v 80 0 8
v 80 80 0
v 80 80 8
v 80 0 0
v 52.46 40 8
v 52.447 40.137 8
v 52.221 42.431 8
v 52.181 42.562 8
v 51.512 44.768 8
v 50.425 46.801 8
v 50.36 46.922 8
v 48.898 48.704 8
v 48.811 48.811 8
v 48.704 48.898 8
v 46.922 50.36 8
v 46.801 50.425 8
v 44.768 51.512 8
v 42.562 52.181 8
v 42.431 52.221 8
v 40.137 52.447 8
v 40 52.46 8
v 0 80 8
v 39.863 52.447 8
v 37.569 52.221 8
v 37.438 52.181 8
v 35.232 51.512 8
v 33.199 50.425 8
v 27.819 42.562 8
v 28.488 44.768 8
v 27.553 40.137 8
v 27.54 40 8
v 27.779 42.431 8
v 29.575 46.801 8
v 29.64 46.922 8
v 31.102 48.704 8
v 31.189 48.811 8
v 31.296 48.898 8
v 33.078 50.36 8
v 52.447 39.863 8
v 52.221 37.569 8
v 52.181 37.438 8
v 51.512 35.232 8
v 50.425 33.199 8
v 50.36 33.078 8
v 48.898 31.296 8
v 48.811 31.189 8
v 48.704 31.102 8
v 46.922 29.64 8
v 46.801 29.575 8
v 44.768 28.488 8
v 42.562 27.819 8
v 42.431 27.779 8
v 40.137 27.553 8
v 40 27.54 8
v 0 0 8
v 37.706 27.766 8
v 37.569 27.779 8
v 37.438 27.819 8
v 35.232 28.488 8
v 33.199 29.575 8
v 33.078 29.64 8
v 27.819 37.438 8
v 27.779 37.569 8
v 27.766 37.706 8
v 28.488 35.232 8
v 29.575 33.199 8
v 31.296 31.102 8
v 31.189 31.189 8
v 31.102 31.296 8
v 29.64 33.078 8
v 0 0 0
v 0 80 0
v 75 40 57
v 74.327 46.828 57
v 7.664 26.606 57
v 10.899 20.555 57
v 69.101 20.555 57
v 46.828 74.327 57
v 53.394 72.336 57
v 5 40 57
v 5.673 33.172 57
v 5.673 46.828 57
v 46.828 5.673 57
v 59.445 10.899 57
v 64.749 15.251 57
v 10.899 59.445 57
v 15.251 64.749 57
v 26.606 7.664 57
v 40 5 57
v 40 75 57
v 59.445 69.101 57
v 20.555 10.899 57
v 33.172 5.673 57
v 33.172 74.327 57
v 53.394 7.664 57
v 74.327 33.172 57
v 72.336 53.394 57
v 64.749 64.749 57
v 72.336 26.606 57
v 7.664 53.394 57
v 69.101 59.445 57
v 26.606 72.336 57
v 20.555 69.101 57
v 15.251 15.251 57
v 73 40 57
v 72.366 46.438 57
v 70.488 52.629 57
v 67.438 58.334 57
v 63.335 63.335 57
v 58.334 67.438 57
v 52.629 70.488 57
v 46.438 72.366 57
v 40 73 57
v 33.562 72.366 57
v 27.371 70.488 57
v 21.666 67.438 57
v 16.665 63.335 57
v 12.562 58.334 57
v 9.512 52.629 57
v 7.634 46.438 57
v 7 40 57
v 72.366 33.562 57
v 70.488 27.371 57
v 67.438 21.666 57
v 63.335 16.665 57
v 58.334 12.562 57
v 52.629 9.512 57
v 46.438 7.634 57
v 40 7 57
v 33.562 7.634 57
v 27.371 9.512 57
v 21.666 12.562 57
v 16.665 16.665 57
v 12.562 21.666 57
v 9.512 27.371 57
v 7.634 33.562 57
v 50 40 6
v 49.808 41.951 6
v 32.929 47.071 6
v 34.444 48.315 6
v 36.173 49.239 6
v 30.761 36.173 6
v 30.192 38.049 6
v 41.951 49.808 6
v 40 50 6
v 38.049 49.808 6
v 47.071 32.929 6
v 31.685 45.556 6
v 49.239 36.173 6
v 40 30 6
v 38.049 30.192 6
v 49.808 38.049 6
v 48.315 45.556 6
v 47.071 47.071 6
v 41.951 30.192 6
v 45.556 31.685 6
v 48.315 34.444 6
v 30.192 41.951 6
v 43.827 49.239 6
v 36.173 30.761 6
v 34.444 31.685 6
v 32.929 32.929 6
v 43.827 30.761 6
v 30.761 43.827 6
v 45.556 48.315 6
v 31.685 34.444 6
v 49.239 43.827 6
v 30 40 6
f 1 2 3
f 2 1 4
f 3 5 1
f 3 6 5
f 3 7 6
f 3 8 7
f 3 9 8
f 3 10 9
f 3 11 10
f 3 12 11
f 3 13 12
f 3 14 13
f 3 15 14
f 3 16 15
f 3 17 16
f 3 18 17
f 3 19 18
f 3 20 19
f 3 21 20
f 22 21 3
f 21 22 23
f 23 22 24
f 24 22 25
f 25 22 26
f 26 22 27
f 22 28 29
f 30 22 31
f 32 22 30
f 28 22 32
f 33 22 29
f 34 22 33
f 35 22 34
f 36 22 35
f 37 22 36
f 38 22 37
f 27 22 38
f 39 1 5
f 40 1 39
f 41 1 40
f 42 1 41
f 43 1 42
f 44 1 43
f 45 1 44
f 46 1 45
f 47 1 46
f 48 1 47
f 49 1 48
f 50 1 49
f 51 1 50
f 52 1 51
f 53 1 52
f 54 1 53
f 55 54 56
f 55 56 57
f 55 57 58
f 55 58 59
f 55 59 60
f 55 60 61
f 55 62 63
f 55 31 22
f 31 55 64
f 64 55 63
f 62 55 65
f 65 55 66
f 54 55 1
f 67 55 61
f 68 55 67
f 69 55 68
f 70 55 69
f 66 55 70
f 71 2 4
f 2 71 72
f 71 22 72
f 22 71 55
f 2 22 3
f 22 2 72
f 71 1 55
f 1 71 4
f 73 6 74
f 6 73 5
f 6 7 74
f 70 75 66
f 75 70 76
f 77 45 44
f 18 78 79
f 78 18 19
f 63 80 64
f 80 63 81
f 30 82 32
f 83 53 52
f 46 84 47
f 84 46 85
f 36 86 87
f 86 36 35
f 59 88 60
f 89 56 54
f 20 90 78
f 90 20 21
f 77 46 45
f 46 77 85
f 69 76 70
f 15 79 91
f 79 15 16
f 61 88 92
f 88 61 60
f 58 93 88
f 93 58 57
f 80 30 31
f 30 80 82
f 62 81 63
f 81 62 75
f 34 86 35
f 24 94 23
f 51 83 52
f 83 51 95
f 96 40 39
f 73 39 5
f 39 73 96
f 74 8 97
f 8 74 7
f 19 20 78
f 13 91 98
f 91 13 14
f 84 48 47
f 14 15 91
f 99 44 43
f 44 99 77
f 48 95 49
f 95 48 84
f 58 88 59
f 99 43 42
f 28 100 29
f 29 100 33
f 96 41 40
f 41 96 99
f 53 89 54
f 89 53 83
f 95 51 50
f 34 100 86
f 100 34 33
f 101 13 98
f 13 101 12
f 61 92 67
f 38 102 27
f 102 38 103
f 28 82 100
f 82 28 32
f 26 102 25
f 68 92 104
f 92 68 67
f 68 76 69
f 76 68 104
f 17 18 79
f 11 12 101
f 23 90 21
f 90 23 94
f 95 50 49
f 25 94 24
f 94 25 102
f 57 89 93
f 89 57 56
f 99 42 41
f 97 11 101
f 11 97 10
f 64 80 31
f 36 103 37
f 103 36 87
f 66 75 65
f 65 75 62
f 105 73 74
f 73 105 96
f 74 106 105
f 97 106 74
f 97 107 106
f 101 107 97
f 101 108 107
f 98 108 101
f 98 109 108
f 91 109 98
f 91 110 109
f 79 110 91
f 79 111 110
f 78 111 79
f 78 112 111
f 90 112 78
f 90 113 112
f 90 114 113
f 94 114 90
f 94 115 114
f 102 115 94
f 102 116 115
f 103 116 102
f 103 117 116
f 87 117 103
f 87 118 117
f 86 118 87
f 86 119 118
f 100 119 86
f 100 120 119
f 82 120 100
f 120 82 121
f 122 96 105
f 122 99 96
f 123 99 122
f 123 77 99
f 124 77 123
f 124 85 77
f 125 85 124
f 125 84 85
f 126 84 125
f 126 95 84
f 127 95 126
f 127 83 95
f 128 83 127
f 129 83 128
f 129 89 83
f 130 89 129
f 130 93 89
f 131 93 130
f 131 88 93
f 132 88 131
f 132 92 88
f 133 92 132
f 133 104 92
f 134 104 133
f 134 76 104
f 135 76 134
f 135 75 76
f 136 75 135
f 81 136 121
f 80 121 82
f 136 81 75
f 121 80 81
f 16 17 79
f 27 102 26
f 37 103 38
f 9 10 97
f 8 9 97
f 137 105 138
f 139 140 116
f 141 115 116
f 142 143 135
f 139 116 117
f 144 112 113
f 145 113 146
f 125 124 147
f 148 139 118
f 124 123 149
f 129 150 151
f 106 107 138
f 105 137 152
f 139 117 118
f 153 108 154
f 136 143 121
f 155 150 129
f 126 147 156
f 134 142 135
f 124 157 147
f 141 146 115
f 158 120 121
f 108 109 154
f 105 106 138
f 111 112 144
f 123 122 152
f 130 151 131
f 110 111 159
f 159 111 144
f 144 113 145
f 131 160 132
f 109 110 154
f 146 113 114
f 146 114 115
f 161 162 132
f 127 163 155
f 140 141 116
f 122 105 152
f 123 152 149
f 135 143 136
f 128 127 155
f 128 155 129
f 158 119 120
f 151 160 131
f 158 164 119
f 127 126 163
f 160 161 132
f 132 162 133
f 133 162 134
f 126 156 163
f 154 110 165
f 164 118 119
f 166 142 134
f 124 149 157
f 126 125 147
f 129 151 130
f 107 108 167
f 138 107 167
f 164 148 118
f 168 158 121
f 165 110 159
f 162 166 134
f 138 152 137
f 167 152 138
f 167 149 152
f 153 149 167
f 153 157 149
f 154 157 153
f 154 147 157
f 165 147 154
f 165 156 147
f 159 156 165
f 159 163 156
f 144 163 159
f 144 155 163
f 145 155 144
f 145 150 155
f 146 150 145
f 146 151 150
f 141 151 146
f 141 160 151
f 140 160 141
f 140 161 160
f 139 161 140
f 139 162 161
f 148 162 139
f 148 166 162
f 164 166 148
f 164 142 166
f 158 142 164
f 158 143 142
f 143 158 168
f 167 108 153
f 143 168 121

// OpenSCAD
$fn = 32;

// ----------------------------------------------------------------------
// Hopper: funnel with square flange
// ----------------------------------------------------------------------

// --- parameters (mm) ---
fl = 80;                  // flange side, X and Y
fl_t = 8;                 // flange thickness
cone_h = 50;              // cone height above the flange
top_d = 70;               // cone mouth diameter
bot_d = 24;               // cone spout diameter
wall = 2;                 // cone wall thickness

bore_d = bot_d - 2 * wall;  // spout bore diameter
total_h = fl_t + cone_h - 1;  // overall height

difference() {
  union() {
    cube([fl, fl, fl_t]);
    translate([fl / 2, fl / 2, fl_t - 1])
      cylinder(h = cone_h, d1 = bot_d, d2 = top_d);
  }
  translate([fl / 2, fl / 2, fl_t - 2])
    cylinder(h = cone_h + 1, d1 = bore_d, d2 = top_d - 2 * wall);
}
